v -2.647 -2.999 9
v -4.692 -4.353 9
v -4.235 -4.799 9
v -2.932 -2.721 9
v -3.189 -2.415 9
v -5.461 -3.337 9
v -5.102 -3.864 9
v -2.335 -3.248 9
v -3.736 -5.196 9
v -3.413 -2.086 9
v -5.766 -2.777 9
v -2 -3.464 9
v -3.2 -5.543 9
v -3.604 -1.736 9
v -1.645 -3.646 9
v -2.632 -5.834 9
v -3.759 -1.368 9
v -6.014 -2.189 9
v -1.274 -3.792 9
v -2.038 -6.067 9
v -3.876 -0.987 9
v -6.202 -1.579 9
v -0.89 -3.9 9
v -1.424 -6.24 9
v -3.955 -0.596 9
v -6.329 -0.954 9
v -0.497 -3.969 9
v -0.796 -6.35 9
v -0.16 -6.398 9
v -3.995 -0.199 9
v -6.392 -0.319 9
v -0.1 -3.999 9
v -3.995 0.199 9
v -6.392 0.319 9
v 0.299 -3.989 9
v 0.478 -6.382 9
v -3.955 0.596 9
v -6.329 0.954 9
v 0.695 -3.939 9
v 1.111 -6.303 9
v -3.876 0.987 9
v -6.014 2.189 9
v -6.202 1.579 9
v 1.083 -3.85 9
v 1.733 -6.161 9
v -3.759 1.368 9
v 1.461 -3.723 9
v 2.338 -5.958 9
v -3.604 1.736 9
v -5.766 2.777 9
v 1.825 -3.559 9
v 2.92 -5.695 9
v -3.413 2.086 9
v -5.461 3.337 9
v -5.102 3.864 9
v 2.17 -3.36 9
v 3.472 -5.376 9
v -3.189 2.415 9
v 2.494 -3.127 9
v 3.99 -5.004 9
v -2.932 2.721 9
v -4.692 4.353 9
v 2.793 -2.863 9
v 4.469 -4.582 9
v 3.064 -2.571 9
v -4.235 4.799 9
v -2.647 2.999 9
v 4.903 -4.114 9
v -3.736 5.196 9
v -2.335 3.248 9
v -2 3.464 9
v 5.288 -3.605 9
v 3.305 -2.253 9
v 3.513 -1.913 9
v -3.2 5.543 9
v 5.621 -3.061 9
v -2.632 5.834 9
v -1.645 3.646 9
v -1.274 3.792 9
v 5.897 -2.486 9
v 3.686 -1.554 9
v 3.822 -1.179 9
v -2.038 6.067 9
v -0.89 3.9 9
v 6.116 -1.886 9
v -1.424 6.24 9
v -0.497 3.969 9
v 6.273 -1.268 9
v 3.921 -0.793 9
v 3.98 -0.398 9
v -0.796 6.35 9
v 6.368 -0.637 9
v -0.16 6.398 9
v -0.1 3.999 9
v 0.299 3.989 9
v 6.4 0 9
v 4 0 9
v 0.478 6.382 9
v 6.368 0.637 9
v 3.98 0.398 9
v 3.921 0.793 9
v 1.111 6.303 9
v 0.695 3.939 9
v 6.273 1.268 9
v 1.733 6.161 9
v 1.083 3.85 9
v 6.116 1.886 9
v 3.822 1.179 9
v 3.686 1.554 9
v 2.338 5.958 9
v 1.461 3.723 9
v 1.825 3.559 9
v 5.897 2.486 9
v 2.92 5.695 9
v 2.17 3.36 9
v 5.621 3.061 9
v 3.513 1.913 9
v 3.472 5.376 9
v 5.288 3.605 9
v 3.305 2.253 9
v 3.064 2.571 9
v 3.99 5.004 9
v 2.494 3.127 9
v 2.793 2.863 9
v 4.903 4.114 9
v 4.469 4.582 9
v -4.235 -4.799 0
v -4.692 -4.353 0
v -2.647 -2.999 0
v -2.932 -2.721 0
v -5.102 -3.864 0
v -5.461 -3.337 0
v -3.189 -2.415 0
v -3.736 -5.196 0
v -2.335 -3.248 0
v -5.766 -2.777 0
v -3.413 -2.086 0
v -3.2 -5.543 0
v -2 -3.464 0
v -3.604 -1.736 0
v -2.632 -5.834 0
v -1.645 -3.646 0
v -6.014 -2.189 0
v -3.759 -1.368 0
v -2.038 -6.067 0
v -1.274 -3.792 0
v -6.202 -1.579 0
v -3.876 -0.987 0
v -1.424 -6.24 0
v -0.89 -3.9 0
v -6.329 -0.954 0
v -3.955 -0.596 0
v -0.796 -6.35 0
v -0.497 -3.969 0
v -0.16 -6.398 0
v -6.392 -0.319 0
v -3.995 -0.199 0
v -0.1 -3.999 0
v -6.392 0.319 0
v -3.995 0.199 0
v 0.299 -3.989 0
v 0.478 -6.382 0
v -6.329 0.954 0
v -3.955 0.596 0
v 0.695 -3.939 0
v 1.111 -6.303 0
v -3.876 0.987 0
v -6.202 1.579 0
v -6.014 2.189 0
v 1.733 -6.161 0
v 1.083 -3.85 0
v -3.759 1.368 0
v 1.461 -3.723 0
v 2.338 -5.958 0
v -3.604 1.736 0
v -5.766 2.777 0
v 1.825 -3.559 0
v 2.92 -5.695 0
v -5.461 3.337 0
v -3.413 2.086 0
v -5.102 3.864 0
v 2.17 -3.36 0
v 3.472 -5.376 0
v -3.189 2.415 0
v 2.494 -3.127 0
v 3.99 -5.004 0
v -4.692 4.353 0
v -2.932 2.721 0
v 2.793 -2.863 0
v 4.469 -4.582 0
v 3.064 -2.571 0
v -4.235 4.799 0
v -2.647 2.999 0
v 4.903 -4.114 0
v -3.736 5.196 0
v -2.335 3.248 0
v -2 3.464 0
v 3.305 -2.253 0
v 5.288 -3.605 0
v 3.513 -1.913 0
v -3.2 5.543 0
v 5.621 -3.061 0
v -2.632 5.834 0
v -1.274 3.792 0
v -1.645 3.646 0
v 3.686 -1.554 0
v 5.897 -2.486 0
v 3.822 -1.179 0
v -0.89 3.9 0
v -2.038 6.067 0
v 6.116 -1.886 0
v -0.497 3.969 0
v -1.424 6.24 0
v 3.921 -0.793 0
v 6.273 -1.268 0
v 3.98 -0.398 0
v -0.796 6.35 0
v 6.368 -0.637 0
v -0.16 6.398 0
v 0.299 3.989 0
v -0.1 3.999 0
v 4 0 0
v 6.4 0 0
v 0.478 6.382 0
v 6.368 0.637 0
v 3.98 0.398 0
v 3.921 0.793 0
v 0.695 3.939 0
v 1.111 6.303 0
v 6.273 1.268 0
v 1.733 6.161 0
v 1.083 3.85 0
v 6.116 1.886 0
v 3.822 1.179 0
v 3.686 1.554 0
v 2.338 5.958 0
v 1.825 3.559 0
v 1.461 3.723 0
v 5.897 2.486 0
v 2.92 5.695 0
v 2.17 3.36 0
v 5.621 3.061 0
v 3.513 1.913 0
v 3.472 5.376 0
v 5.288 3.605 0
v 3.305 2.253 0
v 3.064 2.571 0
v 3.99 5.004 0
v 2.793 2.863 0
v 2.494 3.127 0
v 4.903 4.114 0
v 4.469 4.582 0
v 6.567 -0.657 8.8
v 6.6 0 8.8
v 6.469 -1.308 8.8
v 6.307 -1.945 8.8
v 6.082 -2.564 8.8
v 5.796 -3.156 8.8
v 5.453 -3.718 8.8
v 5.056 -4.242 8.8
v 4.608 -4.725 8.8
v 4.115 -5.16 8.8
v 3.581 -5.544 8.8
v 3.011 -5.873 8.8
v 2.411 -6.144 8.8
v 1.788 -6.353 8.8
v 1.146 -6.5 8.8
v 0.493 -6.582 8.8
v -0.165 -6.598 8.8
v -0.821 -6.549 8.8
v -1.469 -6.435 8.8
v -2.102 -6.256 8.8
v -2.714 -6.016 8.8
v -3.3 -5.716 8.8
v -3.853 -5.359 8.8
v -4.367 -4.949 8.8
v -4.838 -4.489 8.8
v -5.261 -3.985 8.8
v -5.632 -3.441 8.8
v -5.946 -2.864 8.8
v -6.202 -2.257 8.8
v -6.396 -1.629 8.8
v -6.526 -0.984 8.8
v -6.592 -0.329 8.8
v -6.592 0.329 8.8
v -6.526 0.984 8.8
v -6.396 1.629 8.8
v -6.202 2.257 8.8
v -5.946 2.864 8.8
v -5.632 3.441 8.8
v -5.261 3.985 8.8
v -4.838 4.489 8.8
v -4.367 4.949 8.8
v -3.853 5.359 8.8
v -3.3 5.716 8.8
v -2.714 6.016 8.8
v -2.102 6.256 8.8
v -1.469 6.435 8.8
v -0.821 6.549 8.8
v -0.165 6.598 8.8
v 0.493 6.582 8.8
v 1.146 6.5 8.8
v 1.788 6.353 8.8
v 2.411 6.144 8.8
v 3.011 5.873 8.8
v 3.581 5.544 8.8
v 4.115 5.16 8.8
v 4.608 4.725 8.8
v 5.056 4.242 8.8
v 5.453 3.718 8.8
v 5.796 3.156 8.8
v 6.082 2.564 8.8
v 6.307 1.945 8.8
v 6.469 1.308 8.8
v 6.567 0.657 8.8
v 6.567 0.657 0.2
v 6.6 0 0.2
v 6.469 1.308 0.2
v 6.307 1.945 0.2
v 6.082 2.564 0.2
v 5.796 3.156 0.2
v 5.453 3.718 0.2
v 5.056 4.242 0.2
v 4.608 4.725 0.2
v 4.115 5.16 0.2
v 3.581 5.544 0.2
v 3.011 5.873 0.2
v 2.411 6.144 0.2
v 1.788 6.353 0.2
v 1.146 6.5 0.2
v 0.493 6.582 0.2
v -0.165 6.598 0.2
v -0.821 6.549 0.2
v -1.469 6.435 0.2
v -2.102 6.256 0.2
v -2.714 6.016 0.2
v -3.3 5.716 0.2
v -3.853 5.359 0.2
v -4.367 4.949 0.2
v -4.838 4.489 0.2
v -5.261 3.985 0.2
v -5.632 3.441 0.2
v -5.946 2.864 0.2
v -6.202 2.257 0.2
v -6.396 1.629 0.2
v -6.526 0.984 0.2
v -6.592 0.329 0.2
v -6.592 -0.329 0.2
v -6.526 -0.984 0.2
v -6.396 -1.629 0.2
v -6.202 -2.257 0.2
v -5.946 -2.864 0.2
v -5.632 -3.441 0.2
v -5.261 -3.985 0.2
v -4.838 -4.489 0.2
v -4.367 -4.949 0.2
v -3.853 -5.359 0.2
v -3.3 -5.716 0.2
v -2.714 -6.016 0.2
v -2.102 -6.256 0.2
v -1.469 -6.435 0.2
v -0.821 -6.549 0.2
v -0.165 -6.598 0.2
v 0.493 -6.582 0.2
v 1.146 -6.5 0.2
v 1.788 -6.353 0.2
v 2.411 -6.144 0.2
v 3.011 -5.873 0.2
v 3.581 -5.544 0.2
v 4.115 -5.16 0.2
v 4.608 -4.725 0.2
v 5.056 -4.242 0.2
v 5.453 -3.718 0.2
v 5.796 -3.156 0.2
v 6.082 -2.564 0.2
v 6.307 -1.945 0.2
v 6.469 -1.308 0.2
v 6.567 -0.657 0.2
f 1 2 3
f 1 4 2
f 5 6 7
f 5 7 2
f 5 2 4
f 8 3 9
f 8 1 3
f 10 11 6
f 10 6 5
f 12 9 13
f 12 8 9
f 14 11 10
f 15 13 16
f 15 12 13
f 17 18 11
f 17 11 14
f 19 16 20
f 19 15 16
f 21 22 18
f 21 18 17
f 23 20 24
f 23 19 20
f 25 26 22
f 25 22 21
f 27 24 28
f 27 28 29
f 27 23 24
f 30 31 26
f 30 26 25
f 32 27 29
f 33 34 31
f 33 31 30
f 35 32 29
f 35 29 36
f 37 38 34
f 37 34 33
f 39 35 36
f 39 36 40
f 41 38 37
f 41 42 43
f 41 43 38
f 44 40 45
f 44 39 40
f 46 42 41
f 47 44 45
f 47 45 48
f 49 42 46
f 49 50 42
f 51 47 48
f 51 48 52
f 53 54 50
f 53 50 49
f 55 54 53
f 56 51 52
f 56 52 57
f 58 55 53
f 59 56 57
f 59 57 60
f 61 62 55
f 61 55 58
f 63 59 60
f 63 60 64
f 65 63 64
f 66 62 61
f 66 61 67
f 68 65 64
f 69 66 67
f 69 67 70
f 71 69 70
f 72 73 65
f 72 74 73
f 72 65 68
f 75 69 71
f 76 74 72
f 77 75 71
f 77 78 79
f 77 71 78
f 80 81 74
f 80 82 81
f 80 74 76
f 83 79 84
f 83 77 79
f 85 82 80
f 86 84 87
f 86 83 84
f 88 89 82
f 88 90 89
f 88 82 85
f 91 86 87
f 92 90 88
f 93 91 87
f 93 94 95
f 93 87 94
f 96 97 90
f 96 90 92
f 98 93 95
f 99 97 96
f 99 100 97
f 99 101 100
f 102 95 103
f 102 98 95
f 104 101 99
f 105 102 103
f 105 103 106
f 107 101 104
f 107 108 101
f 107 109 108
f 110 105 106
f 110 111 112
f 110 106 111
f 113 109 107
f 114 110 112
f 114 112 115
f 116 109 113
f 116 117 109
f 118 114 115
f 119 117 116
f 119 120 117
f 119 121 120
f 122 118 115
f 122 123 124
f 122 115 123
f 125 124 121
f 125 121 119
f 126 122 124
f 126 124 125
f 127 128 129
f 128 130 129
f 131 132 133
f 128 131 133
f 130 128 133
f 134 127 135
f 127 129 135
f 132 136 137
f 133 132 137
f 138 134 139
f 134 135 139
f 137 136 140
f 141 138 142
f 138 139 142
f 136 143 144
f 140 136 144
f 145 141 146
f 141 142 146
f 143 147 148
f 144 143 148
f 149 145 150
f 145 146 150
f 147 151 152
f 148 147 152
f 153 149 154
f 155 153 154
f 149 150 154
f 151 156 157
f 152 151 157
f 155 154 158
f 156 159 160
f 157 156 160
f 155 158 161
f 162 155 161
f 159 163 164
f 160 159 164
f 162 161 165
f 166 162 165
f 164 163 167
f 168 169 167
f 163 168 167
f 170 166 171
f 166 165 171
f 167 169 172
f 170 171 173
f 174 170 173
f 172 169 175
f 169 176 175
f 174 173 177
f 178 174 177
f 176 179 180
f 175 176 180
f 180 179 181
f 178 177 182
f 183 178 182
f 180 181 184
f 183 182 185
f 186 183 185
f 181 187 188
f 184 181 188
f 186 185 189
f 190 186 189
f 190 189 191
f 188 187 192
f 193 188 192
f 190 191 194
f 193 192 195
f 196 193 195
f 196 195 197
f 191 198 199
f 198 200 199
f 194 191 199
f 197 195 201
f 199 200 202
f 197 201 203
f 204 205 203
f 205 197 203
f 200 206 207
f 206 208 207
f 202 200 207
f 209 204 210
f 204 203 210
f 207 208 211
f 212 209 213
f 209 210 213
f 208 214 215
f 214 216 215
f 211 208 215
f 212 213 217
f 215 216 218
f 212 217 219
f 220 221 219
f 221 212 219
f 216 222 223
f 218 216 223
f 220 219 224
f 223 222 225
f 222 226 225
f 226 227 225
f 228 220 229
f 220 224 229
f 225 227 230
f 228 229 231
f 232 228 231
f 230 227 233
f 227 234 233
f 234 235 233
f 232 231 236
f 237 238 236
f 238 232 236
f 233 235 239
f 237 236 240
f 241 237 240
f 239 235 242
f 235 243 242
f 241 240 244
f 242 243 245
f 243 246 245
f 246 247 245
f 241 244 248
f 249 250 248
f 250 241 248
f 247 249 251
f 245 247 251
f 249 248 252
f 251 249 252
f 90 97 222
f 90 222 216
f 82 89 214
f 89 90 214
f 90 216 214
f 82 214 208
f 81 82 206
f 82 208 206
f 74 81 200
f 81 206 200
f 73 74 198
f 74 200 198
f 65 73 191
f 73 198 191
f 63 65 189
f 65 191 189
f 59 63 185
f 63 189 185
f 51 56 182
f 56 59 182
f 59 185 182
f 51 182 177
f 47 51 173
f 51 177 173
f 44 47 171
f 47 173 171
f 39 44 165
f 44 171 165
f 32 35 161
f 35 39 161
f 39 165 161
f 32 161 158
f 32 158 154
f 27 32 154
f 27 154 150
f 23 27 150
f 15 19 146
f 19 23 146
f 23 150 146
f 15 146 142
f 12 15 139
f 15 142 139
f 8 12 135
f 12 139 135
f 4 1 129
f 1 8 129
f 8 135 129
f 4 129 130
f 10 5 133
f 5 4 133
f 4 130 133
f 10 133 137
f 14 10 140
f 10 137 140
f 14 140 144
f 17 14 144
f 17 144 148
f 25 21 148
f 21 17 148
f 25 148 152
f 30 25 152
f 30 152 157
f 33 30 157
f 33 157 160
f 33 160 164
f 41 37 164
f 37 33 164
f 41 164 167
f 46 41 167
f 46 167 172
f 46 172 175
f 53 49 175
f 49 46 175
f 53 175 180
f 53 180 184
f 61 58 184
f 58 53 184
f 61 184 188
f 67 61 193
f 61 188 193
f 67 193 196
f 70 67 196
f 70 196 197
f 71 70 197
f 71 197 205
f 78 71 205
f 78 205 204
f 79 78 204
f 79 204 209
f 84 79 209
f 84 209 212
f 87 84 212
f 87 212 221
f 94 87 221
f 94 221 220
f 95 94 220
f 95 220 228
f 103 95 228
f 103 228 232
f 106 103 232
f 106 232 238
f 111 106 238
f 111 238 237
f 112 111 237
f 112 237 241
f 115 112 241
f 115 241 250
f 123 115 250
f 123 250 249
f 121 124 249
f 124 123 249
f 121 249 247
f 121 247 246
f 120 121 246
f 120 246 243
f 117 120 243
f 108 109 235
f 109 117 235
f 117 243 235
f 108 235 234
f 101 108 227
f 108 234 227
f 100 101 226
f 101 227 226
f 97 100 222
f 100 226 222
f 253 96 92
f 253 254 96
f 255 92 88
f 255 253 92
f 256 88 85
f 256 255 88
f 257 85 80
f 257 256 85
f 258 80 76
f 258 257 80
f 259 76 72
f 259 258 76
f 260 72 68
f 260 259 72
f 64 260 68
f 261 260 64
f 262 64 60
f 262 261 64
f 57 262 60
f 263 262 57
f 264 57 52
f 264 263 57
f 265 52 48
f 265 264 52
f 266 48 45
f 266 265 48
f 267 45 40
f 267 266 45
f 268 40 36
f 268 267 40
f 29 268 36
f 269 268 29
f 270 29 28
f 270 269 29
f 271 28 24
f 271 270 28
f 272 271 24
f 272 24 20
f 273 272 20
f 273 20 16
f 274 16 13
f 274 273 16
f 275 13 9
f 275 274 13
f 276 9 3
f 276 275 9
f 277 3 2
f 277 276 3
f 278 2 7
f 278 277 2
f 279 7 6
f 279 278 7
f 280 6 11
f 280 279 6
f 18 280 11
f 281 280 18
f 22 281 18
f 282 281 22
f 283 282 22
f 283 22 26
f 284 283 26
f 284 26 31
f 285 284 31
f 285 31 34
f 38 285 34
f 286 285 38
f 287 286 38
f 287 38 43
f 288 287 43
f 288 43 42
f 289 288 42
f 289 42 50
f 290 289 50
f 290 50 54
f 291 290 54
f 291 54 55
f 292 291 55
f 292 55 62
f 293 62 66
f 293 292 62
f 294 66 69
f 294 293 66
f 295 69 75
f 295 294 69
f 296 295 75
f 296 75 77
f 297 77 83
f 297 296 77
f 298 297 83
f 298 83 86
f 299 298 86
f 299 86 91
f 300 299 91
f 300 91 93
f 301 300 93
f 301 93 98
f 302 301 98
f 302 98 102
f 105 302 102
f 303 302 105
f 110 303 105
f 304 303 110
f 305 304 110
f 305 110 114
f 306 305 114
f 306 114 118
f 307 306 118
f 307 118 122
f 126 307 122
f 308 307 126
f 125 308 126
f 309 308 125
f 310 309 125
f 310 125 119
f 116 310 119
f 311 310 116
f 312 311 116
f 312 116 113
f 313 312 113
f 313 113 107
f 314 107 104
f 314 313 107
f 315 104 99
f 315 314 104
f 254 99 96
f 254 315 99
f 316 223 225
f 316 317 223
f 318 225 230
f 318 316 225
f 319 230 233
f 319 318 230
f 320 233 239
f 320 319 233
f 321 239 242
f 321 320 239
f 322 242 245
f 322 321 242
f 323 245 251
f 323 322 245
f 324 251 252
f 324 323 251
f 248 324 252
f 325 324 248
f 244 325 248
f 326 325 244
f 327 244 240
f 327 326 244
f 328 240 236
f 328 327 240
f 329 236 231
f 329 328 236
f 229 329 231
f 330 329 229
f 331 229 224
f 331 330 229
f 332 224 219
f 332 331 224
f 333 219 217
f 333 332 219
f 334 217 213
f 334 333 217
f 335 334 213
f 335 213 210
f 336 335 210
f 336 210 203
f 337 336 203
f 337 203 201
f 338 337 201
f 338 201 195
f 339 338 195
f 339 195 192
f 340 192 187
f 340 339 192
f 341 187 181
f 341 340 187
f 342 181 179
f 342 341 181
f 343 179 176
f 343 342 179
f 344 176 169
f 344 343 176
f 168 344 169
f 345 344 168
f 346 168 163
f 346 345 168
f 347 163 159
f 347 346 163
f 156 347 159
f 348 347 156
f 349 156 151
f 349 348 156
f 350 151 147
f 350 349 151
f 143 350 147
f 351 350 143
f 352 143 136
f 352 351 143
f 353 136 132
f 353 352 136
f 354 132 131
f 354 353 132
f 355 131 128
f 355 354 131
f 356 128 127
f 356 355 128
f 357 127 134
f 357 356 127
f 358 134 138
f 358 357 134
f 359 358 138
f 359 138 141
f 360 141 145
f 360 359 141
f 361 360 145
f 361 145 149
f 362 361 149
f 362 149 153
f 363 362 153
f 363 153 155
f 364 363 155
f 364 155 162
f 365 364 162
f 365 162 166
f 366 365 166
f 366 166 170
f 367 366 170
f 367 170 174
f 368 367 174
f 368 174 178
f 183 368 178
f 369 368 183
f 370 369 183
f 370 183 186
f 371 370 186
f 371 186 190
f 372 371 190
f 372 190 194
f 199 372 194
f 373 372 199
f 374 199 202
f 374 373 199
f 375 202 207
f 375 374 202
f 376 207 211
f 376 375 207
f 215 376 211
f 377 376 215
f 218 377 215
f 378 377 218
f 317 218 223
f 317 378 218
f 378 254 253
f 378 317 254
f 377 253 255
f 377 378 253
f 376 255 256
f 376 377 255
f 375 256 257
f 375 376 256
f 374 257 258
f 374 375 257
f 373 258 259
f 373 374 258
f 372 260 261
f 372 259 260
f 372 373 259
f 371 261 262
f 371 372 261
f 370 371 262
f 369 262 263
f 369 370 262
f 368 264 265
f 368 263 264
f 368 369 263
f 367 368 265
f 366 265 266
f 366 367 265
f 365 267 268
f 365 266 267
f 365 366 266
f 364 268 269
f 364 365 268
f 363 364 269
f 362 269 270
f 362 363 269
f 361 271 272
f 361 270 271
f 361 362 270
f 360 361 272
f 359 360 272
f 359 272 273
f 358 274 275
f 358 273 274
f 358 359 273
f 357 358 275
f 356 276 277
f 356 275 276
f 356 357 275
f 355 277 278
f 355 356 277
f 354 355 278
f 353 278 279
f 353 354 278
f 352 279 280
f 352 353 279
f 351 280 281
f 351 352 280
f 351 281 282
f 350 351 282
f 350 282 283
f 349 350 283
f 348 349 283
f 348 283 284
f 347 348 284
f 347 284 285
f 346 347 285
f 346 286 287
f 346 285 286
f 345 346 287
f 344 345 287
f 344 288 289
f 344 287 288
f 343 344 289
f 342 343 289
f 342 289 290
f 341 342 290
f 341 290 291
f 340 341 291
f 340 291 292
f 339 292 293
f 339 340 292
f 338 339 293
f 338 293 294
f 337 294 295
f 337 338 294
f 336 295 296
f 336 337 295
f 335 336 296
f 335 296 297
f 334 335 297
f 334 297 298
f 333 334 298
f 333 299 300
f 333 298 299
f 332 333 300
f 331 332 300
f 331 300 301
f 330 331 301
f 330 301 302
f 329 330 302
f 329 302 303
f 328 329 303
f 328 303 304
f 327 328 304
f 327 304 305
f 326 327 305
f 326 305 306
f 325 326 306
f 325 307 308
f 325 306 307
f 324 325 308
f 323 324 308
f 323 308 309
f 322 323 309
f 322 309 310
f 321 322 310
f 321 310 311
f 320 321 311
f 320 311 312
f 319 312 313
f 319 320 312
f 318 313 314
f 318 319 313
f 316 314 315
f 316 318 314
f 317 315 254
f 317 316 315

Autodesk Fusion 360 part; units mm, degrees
sketch "Sketch1" plane through (0, 0, 0) normal (0, 0, 1) x (1, 0, 0)
  circle A0 centre (0, 0) radius 4
  circle A1 centre (0, 0) radius 6.6
  dimension "d1" = 8
  dimension "d2" = 13.2
extrude "Extrude1" add sketch "Sketch1" along normal blind 9
chamfer "Chamfer1" distance 0.2 angle 45 1 edges at (-6.1534, -2.3867, 9)
chamfer "Chamfer2" distance 0.2 angle 45 1 edges at (-6.1534, -2.3867, 0)
